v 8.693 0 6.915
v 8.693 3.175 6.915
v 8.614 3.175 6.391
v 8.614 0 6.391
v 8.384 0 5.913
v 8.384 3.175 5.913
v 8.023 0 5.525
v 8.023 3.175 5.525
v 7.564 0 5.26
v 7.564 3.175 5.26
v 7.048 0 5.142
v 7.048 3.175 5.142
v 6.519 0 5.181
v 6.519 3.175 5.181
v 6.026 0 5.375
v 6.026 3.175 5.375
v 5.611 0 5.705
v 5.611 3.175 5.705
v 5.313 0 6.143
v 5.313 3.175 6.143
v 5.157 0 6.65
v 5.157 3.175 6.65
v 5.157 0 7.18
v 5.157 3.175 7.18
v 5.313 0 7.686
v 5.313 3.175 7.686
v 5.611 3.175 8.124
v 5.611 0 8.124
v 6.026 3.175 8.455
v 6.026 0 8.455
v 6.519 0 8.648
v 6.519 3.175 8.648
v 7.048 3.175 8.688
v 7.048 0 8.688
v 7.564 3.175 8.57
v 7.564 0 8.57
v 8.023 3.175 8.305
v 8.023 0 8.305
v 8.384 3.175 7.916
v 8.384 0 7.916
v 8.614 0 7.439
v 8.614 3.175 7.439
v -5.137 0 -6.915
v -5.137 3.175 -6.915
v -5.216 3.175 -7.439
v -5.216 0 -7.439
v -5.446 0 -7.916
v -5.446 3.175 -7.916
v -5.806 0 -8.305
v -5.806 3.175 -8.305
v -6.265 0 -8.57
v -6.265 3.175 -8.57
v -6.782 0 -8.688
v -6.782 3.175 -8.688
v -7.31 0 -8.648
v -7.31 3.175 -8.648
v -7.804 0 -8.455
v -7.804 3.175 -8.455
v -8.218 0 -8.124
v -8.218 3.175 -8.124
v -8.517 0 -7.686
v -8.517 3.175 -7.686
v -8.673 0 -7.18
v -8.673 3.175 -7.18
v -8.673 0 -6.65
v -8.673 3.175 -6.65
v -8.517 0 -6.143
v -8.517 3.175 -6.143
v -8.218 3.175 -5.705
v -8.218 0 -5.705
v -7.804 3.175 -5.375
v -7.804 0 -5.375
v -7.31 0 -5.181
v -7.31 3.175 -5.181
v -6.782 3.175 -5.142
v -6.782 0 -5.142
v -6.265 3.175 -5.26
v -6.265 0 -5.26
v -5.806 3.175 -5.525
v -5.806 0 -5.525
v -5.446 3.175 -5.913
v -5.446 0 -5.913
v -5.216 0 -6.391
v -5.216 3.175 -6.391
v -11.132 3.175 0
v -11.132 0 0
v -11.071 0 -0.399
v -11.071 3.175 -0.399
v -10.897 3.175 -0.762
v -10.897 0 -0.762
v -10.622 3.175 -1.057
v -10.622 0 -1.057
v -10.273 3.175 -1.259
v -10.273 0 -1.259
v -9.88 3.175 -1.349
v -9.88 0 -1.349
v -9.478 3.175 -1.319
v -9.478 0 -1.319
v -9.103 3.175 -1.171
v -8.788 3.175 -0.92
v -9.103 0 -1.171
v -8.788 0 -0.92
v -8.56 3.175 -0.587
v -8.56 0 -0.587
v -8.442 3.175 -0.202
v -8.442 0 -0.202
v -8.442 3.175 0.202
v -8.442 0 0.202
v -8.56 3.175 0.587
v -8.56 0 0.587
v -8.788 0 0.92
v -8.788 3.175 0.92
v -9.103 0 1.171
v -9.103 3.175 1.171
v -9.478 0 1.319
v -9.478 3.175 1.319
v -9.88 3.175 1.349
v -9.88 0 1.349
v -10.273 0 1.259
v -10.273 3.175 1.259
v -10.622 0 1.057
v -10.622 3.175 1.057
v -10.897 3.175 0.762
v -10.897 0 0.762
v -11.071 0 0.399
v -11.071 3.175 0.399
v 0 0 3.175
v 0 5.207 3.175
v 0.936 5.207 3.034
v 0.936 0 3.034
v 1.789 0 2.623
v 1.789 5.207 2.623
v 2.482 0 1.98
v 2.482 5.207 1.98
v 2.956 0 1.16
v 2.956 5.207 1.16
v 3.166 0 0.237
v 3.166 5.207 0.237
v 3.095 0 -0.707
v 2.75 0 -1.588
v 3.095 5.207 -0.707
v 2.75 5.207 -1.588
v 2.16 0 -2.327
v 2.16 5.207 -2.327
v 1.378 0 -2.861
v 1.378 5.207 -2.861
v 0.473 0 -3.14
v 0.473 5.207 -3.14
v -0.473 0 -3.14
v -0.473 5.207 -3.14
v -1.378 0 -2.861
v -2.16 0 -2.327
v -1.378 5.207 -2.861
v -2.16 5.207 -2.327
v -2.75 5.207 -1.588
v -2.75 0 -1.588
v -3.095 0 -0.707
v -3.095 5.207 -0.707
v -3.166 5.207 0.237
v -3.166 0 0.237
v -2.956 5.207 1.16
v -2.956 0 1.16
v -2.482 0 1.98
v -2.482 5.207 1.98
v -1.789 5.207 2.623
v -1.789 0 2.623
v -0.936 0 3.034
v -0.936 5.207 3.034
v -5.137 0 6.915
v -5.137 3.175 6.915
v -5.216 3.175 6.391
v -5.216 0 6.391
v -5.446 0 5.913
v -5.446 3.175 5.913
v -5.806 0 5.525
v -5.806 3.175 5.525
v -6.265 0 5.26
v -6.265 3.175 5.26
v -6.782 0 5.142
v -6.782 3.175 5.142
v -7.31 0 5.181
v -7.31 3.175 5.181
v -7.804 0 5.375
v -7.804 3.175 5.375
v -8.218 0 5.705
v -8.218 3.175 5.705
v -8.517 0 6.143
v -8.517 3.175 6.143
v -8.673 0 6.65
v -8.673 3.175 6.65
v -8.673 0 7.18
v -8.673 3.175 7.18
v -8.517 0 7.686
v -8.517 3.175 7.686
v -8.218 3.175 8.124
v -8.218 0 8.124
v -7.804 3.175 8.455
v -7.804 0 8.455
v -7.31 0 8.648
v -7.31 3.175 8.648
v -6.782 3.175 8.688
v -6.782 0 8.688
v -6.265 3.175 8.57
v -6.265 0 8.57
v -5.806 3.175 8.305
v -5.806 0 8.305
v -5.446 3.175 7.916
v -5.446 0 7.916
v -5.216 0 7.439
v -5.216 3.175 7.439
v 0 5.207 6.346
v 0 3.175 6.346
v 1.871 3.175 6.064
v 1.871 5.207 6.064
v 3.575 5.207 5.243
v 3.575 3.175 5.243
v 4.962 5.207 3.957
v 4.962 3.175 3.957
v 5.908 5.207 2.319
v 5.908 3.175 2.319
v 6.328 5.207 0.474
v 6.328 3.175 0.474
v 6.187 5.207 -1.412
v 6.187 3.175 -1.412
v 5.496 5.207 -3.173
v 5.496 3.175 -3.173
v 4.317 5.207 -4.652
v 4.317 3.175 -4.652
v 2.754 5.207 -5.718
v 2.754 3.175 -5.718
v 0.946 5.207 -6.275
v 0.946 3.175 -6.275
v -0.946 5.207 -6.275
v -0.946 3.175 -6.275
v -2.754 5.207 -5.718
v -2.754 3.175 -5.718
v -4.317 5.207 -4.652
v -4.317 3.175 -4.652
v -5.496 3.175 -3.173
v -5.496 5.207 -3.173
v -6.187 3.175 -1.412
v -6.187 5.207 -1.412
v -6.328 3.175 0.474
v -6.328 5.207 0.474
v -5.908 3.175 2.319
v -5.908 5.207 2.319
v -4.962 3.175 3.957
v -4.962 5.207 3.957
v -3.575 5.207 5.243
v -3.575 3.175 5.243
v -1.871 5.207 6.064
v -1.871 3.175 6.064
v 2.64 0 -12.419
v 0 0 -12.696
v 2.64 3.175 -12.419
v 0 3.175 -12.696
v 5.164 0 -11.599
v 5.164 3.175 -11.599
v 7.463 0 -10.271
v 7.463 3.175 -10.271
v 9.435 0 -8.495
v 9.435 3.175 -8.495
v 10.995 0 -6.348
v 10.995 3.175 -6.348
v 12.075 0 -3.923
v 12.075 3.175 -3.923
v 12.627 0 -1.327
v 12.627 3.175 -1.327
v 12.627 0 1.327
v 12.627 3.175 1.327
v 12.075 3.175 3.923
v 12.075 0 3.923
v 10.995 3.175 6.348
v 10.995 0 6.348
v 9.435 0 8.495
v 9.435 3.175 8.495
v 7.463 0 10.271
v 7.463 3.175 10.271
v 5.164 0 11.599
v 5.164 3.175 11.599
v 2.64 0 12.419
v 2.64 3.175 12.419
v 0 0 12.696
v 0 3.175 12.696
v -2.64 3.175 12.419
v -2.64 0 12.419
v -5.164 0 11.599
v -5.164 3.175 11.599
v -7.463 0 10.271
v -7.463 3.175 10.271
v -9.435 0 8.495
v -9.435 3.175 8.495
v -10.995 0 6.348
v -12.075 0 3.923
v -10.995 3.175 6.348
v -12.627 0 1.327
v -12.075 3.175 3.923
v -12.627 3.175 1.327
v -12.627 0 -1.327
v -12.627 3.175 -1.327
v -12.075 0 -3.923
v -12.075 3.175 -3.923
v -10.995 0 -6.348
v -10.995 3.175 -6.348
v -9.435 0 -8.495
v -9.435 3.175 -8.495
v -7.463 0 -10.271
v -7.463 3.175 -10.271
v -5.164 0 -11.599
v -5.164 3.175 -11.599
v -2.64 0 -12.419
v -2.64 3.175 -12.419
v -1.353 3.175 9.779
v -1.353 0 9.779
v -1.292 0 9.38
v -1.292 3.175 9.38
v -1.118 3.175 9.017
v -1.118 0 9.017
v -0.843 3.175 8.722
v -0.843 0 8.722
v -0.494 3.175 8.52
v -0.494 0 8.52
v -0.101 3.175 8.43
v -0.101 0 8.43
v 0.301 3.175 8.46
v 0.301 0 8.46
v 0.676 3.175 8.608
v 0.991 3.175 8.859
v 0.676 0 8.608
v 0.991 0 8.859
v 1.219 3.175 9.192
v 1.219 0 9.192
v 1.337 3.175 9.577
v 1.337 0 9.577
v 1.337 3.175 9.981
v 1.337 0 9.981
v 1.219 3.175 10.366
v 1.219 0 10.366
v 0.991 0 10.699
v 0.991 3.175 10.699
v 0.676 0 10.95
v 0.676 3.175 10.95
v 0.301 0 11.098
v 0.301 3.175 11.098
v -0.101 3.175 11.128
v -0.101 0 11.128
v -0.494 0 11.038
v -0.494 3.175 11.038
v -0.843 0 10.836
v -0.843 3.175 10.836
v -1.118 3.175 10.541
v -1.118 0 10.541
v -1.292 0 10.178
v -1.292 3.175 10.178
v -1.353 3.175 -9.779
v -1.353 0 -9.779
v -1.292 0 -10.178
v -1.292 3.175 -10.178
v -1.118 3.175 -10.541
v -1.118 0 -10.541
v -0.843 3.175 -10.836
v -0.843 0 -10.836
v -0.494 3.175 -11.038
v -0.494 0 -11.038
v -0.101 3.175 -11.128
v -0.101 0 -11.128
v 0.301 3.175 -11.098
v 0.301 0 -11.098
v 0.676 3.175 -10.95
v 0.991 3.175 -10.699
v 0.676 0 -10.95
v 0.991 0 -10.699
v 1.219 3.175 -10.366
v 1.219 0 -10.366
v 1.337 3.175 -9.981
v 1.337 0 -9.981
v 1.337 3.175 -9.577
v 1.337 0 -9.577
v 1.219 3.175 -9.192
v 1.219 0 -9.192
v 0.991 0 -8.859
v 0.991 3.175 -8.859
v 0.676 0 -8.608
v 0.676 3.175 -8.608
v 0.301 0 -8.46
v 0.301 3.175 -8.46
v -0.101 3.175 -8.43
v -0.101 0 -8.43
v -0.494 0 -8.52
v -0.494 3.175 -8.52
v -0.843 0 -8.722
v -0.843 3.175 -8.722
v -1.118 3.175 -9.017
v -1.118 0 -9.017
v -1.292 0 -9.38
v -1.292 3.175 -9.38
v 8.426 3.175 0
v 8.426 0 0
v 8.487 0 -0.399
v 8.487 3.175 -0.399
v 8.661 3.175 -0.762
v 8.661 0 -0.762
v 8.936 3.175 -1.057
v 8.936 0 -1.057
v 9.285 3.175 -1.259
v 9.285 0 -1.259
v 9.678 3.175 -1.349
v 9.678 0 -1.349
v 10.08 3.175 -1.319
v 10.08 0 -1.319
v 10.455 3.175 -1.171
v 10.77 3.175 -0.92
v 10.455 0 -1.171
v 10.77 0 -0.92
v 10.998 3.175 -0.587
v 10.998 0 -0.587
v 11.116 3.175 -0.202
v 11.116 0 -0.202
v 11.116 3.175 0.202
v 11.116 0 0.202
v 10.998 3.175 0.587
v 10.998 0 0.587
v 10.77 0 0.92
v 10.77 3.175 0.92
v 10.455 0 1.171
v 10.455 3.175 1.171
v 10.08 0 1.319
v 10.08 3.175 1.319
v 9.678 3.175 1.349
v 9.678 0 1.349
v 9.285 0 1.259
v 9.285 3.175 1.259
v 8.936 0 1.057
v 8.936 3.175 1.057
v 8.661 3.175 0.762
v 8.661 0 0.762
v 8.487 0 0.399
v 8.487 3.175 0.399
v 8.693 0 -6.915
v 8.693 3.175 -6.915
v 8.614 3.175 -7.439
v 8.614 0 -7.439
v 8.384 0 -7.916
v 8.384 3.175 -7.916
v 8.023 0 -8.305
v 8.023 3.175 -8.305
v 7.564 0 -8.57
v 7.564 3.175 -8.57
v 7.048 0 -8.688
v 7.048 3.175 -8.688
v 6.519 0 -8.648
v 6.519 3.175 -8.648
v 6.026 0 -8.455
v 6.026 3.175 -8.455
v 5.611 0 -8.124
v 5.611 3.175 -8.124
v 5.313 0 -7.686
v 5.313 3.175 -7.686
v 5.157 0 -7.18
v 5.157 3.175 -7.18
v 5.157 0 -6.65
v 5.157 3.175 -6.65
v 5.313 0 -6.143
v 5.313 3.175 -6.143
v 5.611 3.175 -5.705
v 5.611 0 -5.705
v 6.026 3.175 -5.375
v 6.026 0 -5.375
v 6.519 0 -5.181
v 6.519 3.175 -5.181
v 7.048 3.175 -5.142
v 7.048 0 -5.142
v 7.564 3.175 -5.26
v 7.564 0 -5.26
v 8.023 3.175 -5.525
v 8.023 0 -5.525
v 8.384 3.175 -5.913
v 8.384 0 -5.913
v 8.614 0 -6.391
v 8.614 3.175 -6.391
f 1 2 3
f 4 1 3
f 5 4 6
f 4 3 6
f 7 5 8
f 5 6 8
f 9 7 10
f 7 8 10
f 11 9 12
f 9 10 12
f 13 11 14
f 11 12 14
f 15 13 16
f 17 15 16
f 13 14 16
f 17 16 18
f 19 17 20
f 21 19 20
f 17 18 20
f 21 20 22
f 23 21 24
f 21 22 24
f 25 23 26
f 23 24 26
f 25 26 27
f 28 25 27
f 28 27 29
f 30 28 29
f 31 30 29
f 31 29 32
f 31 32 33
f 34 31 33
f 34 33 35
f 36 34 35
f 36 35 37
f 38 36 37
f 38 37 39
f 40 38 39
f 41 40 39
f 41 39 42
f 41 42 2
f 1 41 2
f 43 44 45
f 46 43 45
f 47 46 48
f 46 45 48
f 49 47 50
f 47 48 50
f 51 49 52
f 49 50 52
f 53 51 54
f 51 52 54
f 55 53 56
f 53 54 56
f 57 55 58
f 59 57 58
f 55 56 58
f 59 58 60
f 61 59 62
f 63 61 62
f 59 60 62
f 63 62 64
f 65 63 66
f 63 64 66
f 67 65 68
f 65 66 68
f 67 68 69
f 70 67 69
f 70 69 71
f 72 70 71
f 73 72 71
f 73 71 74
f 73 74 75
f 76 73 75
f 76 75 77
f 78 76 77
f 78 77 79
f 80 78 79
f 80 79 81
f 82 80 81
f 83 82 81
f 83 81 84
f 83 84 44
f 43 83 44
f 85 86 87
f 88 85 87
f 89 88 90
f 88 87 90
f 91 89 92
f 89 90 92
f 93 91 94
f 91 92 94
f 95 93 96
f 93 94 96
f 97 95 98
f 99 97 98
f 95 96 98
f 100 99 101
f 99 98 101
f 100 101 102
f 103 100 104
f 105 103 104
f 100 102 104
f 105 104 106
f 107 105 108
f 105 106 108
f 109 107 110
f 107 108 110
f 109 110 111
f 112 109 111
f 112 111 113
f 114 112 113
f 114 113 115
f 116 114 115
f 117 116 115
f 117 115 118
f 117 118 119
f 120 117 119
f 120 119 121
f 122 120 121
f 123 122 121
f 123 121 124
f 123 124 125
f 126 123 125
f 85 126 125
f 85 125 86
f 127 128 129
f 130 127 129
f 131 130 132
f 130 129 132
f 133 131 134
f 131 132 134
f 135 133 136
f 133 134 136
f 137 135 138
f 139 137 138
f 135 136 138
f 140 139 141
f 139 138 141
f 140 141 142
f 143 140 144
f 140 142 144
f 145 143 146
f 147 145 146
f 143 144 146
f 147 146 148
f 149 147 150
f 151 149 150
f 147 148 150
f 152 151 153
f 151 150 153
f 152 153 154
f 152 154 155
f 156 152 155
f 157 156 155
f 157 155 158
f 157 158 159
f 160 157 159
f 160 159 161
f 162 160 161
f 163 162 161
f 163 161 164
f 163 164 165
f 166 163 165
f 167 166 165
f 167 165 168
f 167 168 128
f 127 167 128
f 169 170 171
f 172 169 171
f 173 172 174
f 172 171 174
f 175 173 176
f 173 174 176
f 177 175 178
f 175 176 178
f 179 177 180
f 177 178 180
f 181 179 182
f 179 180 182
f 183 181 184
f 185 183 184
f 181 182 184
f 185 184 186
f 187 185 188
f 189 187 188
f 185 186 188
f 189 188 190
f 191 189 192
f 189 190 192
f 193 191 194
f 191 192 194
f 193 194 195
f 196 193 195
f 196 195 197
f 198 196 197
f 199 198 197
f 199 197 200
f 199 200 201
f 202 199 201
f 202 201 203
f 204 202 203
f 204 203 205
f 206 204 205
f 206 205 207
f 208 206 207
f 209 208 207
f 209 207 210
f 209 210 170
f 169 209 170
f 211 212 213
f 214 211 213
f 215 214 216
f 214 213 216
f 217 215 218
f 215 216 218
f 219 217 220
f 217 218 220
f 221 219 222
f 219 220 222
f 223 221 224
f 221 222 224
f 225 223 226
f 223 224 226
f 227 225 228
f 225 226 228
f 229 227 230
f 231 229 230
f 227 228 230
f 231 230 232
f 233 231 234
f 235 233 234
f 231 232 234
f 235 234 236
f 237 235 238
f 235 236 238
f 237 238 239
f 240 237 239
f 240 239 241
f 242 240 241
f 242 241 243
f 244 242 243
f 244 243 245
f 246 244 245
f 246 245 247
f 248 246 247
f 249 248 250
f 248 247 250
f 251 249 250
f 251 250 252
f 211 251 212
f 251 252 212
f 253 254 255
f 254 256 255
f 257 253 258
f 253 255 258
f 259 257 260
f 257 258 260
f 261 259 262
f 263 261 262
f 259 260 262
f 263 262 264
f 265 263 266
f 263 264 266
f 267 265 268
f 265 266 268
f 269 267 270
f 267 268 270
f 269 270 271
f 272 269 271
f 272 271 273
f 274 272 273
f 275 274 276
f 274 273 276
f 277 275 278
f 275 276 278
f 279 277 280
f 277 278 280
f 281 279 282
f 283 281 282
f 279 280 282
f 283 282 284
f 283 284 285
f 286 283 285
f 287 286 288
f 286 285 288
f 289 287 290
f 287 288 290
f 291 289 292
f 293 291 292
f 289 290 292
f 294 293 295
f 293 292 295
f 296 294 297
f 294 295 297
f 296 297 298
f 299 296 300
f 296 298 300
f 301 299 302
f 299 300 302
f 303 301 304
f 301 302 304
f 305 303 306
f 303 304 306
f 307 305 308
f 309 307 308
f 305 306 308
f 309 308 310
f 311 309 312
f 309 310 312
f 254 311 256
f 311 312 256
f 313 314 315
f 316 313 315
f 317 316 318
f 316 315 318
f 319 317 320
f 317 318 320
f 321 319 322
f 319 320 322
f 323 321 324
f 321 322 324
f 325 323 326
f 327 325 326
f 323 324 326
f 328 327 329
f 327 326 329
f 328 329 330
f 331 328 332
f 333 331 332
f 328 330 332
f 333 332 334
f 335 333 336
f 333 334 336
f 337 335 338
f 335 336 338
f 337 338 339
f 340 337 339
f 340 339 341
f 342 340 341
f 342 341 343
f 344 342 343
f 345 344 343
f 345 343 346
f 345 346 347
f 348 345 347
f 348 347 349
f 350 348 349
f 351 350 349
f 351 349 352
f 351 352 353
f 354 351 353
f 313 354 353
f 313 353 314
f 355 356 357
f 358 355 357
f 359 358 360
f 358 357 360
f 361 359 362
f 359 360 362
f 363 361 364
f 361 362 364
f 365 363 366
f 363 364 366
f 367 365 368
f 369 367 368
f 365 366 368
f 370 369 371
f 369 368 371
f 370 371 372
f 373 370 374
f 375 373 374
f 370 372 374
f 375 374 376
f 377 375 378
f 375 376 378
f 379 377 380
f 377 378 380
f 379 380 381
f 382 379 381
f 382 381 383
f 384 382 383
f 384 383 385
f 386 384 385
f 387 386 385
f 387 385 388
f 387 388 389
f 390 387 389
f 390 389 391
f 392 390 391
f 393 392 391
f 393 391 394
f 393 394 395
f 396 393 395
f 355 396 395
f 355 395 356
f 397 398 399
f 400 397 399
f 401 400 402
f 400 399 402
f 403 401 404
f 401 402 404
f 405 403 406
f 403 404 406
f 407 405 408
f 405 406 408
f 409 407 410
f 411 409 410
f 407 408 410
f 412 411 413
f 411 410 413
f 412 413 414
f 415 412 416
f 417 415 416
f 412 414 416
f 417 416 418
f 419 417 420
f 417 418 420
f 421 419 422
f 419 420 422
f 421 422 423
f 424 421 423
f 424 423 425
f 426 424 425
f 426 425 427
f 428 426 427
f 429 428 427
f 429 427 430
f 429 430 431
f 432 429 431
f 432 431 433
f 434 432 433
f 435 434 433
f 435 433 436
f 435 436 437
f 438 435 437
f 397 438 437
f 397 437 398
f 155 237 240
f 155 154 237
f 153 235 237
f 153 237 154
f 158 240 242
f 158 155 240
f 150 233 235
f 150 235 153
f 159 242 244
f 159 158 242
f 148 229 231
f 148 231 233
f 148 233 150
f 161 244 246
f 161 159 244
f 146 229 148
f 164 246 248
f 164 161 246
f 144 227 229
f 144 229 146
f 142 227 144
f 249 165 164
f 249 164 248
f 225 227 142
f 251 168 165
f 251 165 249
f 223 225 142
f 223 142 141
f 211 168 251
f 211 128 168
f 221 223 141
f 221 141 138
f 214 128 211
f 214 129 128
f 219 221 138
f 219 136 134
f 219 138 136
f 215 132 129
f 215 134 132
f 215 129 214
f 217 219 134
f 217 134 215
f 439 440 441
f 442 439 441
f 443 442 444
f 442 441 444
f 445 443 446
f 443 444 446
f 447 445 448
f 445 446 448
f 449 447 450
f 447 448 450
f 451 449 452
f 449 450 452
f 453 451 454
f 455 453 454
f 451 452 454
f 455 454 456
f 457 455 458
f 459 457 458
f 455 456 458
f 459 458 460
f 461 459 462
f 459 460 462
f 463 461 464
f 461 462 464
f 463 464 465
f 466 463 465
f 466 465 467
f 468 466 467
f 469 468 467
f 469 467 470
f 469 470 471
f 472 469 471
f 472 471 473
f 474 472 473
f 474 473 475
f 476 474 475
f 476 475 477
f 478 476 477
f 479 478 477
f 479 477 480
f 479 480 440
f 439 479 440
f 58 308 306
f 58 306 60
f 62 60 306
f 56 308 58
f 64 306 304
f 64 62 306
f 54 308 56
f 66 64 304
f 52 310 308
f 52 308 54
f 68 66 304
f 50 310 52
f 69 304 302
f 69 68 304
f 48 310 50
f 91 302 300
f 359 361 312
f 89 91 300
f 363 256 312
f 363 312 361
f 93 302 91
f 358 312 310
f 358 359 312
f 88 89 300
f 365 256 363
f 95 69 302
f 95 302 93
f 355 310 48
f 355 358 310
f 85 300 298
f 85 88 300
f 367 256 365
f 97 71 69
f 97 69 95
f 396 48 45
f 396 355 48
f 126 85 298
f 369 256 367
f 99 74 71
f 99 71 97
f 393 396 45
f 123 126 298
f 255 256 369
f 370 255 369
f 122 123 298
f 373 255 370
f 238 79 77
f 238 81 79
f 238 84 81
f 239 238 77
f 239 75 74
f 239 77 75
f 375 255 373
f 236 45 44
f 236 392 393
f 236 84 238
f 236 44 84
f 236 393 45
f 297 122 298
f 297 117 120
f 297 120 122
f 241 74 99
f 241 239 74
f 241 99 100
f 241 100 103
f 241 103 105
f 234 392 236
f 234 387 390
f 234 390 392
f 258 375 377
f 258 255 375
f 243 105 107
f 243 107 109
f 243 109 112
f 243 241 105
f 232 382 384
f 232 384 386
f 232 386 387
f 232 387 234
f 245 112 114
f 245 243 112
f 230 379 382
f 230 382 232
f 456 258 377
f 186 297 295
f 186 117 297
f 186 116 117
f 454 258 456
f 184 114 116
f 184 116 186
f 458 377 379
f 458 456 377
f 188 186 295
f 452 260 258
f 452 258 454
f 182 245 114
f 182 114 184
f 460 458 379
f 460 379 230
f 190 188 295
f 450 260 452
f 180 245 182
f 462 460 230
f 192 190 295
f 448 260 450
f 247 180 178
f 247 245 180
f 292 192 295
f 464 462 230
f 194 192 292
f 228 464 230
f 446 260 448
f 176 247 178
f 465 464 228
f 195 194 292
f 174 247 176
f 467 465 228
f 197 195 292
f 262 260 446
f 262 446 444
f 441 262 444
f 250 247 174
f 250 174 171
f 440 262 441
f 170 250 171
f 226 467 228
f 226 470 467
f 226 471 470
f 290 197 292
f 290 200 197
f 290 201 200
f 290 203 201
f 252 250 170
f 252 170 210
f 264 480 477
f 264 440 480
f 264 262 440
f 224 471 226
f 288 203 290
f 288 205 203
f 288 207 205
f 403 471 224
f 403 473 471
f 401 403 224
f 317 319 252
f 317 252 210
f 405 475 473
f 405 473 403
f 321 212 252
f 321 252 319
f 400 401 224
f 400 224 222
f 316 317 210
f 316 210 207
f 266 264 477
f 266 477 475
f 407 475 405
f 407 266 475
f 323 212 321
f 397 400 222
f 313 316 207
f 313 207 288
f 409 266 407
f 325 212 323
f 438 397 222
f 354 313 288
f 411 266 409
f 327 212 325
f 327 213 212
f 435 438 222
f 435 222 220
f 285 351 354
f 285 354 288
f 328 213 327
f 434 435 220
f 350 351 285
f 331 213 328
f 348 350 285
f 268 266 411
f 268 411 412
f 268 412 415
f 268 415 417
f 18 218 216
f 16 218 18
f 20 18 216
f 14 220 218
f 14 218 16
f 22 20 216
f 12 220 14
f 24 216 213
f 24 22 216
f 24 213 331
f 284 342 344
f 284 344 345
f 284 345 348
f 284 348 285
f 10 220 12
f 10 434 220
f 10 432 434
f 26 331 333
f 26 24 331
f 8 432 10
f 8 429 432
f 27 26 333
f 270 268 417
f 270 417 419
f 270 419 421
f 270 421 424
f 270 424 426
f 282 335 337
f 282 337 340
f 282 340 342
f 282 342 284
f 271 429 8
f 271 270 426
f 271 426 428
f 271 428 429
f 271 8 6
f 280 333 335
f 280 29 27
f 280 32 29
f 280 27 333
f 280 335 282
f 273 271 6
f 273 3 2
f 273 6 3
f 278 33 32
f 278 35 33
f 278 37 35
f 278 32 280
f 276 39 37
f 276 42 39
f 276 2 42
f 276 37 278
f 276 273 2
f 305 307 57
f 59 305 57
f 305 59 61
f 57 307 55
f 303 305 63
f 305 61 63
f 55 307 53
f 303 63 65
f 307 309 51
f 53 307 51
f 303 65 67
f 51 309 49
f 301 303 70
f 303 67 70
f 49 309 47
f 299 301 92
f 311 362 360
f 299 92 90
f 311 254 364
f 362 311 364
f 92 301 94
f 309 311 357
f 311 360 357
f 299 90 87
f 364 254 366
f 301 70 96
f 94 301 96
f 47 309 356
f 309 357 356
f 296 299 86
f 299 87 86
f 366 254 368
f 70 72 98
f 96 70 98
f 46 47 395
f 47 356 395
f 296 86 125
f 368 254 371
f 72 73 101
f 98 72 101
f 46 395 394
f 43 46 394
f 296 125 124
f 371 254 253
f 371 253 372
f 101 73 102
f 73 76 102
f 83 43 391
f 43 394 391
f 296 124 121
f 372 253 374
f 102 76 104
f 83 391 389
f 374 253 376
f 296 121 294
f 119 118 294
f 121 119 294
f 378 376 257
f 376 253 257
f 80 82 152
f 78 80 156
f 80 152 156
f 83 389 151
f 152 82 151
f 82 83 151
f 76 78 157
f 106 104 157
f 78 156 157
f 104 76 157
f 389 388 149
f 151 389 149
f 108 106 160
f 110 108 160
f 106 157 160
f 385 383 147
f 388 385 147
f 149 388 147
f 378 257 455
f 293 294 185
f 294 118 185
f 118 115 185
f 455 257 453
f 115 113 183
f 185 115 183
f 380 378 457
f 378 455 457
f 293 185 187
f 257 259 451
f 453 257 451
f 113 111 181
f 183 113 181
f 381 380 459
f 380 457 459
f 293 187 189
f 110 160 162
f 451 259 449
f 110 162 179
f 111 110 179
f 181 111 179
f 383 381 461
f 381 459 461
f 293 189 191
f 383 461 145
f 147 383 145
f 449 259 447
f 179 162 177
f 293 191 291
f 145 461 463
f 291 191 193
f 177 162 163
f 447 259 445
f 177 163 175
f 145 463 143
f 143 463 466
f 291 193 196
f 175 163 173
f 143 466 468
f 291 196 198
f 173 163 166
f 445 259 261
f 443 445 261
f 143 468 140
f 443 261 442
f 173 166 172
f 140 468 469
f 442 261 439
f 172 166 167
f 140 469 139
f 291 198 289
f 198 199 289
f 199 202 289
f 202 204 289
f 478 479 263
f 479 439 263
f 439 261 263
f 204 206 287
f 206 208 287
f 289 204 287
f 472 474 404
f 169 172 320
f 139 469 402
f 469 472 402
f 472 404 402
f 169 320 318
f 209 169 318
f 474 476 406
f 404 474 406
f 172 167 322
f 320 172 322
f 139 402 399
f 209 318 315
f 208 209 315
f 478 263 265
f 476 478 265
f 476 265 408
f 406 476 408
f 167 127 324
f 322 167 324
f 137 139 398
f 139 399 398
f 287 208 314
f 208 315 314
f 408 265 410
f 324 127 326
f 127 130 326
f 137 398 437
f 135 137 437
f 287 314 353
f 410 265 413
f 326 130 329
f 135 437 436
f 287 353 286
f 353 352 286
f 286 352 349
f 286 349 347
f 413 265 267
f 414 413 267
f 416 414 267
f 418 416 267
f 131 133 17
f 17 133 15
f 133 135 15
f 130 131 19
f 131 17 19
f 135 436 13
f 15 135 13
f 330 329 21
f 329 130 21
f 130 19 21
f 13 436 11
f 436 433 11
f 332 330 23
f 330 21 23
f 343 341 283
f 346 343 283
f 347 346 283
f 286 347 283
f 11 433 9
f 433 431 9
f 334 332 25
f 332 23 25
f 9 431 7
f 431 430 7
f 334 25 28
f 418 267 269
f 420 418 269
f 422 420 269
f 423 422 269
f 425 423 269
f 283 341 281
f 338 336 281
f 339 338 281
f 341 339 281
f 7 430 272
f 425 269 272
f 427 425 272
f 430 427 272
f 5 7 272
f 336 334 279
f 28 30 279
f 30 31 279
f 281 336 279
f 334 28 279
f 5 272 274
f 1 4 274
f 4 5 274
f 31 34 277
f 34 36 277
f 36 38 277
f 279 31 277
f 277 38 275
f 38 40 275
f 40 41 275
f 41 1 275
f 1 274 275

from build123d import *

# Parameters (mm, degrees)
SKETCH1_W                = 12.69619
SKETCH1_H                = 3.175
SKETCH2_R                = 6.34619
BOSS_EXTRUDE1_DEPTH      = 2.032
M2_5_CLEARANCE_HOLE1_D   = 2.7051
M3_CLEARANCE_HOLE1_D     = 3.556
M3_CLEARANCE_HOLE1_DEPTH = 5.207
SKETCH9_R                = 3.175
CUT_EXTRUDE1_DEPTH       = 19.694901177


with BuildPart() as part:
    # Sketch1 → Revolve1 (revolve)
    with BuildSketch(Plane.XY, mode=Mode.PRIVATE) as revolve1_sk:
        with Locations((6.348095, 1.5875)):
            Rectangle(SKETCH1_W, SKETCH1_H)
    revolve(revolve1_sk.sketch.rotate(Axis((0, 3.175, 0), (0, -1, 0)), 270), axis=Axis((0, 3.175, 0), (0, -1, 0)))

    # Sketch2 → Boss-Extrude1 (add)
    with BuildSketch(Plane(origin=(0, 3.175, 0), x_dir=(-1, 0, 0), z_dir=(0, 1, 0))):
        with Locations(Location((0, 0, 0), (0, 0, 90))):
            Circle(SKETCH2_R)
    extrude(amount=BOSS_EXTRUDE1_DEPTH)

    # M2.5 Clearance Hole1 (through all)
    with Locations(Plane(origin=(0, 3.175, 0), x_dir=(1, 0, 0), z_dir=(0, 1, 0))):
        with Locations((-9.779, 0), (0, 9.779), (9.779, 0), (0, -9.779)):
            Hole(M2_5_CLEARANCE_HOLE1_D / 2)

    # M3 Clearance Hole1
    with Locations(Plane(origin=(0, 0, 0), x_dir=(-1, 0, 0), z_dir=(0, -1, 0))):
        with Locations((6.914797213, 6.914797213), (-6.914797213, 6.914797213), (-6.914797213, -6.914797213), (6.914797213, -6.914797213)):
            Hole(M3_CLEARANCE_HOLE1_D / 2, depth=M3_CLEARANCE_HOLE1_DEPTH)

    # Sketch9 → Cut-Extrude1 (cut, through all)
    with BuildSketch(Plane(origin=(0, 5.207, 0), x_dir=(1, 0, 0), z_dir=(0, 1, 0))):
        with Locations(Location((0, 0, 0), (0, 0, 270))):
            Circle(SKETCH9_R)
    extrude(amount=-CUT_EXTRUDE1_DEPTH, mode=Mode.SUBTRACT)


solid = part.part
